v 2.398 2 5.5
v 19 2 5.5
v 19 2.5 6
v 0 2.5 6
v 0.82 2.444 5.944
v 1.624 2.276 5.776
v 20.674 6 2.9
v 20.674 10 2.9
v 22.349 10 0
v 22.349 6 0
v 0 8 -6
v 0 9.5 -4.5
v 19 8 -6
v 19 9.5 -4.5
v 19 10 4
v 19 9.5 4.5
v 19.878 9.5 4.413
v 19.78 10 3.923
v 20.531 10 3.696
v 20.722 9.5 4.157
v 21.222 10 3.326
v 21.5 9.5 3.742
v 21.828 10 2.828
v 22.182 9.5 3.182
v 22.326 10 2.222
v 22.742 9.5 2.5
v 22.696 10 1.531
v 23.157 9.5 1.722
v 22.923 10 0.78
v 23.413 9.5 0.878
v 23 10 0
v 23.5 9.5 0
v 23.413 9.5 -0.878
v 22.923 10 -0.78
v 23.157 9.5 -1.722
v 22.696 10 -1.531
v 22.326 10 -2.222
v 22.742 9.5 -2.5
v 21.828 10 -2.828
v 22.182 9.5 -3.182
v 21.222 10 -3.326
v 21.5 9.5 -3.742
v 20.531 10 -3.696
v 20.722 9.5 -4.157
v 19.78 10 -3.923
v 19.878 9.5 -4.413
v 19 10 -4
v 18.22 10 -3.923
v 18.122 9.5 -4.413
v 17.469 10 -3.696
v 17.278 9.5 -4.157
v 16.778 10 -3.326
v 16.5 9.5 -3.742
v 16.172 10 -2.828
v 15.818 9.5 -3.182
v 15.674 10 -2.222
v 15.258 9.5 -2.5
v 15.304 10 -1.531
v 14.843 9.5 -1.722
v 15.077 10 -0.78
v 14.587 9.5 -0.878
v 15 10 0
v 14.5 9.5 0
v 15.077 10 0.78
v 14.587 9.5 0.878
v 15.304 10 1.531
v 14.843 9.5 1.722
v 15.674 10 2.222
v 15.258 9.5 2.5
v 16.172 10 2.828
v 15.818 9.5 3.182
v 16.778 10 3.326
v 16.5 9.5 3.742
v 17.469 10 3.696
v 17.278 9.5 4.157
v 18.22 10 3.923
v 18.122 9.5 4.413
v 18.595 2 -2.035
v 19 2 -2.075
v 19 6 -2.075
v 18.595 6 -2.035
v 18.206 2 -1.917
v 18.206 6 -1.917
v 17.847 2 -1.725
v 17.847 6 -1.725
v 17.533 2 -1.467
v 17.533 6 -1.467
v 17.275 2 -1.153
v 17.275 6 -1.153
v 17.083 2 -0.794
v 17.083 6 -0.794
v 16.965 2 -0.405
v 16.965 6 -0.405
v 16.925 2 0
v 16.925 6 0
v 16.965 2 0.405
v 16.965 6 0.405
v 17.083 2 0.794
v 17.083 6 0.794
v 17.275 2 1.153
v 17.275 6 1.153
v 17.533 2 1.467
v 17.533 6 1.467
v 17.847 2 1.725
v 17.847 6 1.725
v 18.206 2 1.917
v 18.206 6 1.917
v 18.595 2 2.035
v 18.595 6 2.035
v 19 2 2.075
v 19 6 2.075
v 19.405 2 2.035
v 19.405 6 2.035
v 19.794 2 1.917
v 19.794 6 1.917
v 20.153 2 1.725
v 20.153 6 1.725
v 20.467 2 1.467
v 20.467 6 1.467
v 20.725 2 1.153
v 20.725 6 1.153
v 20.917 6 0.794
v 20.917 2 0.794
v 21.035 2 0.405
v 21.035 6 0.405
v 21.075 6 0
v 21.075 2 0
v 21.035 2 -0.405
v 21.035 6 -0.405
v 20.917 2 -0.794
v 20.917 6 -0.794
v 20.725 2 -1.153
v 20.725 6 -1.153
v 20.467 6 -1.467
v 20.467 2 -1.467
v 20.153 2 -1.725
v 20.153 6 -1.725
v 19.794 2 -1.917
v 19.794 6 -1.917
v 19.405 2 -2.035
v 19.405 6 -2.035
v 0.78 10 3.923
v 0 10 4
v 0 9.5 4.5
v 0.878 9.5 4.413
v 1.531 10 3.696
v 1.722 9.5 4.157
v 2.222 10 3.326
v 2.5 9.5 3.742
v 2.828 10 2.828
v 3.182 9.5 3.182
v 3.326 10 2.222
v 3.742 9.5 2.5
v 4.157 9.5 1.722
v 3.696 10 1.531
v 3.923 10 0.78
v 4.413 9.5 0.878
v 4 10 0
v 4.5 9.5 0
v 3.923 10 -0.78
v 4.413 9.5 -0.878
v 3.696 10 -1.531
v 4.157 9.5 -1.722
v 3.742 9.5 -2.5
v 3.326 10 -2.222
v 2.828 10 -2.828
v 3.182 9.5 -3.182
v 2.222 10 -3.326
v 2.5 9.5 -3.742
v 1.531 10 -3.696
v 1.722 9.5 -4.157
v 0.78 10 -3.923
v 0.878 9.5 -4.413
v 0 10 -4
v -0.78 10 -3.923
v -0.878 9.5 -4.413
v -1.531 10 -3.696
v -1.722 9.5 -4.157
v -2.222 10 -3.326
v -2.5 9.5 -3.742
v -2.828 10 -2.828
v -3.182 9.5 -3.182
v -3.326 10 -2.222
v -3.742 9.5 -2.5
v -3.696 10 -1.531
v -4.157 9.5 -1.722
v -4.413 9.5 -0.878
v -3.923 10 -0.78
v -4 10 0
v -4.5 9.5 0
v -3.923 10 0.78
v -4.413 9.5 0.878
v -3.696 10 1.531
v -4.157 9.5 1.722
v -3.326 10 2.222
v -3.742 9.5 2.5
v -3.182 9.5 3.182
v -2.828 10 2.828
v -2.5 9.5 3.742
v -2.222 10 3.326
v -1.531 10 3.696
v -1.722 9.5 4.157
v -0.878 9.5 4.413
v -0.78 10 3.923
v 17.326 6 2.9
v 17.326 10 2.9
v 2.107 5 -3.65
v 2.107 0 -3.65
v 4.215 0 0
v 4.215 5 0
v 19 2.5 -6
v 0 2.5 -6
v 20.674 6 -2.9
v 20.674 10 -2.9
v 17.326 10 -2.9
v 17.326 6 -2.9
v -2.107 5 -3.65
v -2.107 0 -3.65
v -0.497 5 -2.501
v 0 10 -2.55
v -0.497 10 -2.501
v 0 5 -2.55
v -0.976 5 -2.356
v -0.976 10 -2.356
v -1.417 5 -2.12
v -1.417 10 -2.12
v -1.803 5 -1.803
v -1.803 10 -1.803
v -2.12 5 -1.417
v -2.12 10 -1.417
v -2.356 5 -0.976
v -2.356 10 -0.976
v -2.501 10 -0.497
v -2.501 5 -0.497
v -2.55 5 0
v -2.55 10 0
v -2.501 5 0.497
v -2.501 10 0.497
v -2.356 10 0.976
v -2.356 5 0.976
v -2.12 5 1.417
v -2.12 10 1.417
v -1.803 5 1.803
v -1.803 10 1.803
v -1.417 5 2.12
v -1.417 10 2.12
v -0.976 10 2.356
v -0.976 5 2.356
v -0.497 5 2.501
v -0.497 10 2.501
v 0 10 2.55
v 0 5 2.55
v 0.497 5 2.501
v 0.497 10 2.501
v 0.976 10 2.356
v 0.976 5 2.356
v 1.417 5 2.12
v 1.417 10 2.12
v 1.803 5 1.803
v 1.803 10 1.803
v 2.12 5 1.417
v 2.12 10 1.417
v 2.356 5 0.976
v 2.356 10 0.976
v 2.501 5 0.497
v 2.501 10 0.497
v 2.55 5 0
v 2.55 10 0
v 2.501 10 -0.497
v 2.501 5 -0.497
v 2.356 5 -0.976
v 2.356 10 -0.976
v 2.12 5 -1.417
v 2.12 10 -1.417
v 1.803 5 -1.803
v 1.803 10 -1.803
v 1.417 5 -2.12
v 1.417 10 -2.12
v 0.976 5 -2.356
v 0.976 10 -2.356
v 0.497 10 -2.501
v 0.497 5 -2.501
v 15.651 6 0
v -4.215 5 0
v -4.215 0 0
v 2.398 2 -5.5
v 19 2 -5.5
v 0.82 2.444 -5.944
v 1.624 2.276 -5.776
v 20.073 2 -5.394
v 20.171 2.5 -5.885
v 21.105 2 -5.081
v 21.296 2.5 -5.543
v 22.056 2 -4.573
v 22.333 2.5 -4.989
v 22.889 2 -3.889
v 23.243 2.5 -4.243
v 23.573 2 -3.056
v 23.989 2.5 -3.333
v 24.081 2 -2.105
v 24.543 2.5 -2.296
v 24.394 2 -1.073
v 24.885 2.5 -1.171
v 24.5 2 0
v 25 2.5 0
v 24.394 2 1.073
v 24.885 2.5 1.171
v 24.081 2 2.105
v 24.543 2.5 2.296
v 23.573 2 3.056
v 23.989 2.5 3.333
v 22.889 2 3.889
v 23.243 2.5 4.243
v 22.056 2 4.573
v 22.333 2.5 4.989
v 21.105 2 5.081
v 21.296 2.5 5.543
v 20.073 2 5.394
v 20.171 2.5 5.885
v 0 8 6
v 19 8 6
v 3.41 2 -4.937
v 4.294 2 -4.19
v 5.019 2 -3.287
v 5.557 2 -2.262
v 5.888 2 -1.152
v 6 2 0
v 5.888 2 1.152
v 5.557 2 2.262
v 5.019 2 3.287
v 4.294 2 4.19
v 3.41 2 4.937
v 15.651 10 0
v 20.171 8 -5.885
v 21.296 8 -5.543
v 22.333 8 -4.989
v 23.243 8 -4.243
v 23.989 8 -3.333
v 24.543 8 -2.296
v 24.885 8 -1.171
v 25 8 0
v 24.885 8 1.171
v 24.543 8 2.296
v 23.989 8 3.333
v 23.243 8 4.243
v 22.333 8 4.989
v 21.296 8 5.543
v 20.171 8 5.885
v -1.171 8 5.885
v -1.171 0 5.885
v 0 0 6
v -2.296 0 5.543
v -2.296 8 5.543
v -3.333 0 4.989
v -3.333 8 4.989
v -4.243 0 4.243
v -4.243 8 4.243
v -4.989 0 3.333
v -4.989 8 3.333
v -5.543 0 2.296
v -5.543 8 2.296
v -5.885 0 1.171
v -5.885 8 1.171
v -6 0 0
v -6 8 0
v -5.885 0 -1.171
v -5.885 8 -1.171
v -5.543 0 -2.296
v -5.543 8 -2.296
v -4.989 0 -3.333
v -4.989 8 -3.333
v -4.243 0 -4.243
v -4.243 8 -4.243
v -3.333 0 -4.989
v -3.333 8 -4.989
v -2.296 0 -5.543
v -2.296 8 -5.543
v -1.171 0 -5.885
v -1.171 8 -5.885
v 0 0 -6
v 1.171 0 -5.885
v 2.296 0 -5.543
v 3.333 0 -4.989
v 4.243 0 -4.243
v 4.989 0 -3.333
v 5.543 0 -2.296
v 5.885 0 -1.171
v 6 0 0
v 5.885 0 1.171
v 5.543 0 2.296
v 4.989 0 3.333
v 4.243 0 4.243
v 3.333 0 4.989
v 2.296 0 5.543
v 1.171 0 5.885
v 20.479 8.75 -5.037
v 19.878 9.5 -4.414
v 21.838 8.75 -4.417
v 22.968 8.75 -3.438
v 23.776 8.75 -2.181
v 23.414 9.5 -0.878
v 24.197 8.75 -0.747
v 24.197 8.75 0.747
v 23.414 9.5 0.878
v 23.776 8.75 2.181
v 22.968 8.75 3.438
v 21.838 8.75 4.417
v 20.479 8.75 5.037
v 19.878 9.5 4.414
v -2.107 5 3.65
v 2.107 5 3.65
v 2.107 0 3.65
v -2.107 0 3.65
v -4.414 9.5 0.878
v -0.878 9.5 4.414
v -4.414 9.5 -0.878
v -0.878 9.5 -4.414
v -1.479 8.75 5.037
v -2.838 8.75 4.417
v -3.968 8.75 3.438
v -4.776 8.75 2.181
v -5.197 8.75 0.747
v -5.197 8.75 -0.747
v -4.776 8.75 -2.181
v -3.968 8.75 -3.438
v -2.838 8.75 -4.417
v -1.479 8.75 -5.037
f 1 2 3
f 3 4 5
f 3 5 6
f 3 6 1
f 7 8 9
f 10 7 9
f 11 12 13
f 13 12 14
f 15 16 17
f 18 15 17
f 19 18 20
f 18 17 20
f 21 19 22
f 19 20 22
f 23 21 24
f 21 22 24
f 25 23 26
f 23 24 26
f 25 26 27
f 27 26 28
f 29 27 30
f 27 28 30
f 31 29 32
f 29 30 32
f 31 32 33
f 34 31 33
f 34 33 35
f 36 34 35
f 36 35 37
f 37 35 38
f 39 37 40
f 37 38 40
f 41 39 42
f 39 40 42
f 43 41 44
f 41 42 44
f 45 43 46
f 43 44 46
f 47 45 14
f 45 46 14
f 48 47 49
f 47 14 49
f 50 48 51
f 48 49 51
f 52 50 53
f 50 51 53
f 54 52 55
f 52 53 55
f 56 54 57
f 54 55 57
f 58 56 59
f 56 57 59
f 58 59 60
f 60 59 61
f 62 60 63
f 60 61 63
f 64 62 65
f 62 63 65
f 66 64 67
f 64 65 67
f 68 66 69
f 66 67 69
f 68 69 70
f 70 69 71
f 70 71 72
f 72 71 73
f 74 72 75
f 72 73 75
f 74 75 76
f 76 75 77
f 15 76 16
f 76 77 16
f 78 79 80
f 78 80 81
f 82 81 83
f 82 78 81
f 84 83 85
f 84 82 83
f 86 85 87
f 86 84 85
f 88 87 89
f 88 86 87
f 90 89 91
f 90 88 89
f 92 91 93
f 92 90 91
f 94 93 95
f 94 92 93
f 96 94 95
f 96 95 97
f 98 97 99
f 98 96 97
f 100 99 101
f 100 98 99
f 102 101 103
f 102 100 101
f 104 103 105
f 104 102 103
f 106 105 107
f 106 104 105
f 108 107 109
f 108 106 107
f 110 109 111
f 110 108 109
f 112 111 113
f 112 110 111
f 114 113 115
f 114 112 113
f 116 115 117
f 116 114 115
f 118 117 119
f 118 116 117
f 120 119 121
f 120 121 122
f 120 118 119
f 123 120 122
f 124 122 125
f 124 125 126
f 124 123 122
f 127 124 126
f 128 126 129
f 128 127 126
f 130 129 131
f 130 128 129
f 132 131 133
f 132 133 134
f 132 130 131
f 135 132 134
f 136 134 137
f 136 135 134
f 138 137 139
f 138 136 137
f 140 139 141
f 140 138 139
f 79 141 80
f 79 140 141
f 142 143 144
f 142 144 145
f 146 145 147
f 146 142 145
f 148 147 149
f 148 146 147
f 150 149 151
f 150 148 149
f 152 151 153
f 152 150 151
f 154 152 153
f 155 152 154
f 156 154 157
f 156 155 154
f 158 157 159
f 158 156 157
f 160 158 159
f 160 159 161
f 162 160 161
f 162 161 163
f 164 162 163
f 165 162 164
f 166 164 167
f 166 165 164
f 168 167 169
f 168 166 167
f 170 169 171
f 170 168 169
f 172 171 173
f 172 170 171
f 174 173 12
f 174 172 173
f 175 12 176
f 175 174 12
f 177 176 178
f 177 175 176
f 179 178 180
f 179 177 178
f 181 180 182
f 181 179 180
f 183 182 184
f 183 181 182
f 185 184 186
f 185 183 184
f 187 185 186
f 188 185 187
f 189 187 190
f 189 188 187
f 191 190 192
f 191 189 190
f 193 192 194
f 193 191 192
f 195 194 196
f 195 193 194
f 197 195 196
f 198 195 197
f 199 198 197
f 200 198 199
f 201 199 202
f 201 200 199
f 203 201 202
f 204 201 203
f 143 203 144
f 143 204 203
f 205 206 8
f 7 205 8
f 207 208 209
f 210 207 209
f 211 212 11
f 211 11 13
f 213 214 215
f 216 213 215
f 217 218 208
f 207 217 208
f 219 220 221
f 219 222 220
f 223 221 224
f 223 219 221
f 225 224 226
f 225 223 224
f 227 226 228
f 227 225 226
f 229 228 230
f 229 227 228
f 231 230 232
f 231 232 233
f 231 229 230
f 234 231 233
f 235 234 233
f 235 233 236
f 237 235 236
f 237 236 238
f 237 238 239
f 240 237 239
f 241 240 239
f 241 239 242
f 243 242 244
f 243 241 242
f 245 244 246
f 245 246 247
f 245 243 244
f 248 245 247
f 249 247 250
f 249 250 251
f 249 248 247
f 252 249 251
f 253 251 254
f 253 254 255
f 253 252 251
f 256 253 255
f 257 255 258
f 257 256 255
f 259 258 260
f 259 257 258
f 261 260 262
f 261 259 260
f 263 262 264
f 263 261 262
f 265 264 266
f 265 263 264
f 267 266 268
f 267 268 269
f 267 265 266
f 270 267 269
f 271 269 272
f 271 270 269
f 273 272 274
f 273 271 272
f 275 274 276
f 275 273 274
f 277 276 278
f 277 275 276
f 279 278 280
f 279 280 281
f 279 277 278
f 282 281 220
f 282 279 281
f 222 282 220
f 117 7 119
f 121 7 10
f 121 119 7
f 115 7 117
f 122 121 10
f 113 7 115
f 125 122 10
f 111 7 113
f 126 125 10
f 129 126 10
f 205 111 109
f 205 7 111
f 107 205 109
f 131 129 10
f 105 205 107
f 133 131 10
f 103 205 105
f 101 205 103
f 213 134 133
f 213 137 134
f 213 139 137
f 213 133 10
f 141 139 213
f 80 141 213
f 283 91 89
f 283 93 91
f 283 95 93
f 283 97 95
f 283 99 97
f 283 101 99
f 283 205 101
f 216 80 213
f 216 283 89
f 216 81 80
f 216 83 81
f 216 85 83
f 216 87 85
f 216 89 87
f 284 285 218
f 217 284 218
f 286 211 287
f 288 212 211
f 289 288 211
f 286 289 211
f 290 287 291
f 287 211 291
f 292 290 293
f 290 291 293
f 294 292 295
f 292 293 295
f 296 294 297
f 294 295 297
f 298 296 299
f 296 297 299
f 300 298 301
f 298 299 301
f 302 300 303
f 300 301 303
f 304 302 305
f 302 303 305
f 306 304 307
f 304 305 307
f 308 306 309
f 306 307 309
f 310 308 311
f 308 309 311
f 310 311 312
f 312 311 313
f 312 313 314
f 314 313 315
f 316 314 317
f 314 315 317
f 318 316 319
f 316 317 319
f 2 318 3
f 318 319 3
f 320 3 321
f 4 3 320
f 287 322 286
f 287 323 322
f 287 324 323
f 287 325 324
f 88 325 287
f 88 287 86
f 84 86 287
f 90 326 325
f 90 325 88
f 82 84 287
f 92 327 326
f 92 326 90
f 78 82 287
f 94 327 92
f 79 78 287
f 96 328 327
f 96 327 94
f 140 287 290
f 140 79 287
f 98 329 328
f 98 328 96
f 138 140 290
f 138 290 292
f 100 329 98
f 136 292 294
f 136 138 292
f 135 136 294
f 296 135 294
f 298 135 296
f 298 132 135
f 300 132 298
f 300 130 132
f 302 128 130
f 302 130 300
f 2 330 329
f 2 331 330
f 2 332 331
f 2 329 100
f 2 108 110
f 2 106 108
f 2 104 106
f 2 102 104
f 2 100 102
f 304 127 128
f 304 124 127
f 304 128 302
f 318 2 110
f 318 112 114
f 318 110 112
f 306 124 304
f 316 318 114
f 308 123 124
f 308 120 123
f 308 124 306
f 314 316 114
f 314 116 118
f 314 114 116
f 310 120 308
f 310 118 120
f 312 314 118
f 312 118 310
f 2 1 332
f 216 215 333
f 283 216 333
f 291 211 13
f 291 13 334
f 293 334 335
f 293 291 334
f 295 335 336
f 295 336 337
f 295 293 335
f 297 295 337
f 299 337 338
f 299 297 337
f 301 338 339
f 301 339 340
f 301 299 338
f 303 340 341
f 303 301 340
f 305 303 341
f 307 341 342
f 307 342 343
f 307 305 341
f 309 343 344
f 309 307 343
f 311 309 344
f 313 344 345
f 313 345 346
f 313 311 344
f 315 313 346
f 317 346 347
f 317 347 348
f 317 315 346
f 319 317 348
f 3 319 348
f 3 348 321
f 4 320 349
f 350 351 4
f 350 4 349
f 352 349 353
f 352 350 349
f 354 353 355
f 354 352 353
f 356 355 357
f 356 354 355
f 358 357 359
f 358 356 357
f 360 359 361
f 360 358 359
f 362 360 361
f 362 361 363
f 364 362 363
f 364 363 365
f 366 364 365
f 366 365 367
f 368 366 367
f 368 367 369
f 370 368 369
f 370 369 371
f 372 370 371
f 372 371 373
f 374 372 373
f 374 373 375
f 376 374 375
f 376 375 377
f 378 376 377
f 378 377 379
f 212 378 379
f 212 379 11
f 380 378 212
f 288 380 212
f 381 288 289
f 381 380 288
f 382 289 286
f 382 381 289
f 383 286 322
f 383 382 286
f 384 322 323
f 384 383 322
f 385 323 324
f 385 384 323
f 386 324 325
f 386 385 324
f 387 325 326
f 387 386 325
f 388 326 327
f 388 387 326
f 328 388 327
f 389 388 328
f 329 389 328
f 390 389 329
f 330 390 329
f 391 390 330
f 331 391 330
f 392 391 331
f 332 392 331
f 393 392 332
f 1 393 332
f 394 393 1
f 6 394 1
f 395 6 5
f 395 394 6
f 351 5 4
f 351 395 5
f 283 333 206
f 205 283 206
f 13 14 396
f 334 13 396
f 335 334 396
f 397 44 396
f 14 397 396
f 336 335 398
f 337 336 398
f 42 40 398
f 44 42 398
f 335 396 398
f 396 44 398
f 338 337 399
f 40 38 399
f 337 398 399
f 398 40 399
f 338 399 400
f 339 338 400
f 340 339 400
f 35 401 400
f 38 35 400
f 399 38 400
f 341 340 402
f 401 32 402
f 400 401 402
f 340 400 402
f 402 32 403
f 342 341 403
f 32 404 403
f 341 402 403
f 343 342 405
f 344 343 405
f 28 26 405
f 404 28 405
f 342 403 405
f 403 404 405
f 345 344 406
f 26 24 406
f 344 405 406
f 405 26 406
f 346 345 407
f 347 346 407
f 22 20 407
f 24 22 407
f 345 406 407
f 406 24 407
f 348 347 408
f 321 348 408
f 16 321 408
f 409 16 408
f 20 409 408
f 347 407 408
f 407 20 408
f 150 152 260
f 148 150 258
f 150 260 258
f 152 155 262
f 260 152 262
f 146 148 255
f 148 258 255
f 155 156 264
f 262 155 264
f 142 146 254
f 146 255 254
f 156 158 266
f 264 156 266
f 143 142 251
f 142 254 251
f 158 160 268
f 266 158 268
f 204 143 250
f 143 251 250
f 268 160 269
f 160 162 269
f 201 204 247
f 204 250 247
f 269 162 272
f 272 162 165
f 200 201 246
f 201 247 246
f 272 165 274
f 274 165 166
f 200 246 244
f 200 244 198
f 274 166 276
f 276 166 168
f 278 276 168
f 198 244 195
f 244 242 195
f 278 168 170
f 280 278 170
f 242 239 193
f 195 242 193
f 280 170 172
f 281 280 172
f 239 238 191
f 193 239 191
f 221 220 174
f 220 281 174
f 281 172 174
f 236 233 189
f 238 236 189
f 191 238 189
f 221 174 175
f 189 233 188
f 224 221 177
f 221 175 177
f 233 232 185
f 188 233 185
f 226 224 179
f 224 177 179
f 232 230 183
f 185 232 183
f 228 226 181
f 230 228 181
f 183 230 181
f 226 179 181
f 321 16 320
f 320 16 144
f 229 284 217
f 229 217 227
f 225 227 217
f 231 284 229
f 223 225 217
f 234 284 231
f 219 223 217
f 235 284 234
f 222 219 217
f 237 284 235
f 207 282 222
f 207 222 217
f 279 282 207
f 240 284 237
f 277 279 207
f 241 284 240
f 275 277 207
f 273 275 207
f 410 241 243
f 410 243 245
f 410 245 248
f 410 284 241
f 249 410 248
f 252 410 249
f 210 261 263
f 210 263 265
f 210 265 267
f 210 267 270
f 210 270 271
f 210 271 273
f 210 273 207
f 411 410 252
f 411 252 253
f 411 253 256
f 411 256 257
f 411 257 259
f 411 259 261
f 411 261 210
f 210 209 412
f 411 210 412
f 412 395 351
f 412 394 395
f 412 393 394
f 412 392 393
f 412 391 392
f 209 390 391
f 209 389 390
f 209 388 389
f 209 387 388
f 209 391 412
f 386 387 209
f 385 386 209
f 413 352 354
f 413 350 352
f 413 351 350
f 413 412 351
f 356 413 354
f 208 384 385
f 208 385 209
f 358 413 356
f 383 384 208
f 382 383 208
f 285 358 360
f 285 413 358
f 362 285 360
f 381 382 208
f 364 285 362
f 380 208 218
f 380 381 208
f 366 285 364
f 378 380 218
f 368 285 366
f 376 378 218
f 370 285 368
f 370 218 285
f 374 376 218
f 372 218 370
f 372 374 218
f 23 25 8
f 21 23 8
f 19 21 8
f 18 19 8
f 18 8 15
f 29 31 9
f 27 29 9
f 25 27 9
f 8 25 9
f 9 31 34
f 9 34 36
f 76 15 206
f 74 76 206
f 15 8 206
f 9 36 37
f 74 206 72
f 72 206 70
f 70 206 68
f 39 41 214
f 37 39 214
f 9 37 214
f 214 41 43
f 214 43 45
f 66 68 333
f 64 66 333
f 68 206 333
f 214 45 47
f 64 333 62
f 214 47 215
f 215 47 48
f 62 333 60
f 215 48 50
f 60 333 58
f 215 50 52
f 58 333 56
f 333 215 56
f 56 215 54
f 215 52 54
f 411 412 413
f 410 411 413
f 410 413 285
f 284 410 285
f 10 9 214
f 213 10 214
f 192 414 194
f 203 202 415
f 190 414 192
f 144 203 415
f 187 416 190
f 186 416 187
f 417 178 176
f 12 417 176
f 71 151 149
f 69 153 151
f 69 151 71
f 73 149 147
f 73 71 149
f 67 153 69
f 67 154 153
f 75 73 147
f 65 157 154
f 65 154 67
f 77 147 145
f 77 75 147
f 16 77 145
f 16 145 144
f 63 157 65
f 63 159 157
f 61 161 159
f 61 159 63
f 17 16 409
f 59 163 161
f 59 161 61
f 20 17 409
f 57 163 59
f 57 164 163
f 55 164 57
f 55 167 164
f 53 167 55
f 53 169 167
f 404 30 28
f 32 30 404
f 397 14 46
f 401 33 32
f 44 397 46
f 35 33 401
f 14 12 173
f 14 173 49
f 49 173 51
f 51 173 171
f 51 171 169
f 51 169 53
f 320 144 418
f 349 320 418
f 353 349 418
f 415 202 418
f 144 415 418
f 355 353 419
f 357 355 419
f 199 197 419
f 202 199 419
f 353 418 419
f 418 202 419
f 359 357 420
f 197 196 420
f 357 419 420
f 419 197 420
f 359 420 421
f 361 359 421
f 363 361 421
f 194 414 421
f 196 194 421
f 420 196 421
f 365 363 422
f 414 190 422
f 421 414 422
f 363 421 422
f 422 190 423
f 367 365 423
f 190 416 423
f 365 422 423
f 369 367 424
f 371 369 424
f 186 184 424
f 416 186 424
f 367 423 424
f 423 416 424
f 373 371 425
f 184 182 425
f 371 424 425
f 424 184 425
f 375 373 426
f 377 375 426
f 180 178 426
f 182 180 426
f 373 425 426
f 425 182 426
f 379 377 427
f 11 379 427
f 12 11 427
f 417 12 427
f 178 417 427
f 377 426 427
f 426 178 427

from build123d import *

# Parameters (mm, degrees)
BOSS_EXTRUDE1_DEPTH = 10
CHAMFER1_SIZE       = 2
CUT_EXTRUDE1_DEPTH  = 5
SKETCH5_R           = 34.202431596
SKETCH5_R_2         = 6
CUT_EXTRUDE2_DEPTH  = 2
CUT_EXTRUDE3_DEPTH  = 4
CHAMFER2_SIZE       = 0.5
SKETCH7_W           = 40.92273168
SKETCH7_H           = 22.154300558
SKETCH7_R           = 4
CUT_EXTRUDE4_DEPTH  = 0.5
CHAMFER3_SIZE       = 0.5


# Some blends are built 0.0001 mm under size
with BuildPart() as part:
    # Sketch1 → Boss-Extrude1 (new body)
    with BuildSketch(Plane(origin=(0, 0, 0), x_dir=(1, 0, 0), z_dir=(0, 1, 0))):
        with BuildLine():
            Line((0, 6), (19, 6))
            ThreePointArc((19, 6), (25, 0), (19, -6))
            Line((19, -6), (0, -6))
            ThreePointArc((0, -6), (-6, 0), (0, 6))
        make_face()
    extrude(amount=BOSS_EXTRUDE1_DEPTH)

    # Sketch2 → Cut-Revolve1 (revolve, cut)
    with BuildSketch(Plane.XY, mode=Mode.PRIVATE) as cut_revolve1_sk:
        Polygon((0, 10), (-2.55, 10), (-2.55, 5), (-2.1, 5), (-2.1, 2), (-2.55, 2), (-2.55, 0), (0, 0), align=None)
    revolve(cut_revolve1_sk.sketch.rotate(Axis((0, 0, 0), (0, 1, 0)), 270), axis=Axis((0, 0, 0), (0, 1, 0)), mode=Mode.SUBTRACT)

    # Sketch3 → Cut-Revolve2 (revolve, cut)
    with BuildSketch(Plane.XY, mode=Mode.PRIVATE) as cut_revolve2_sk:
        Polygon((19, 10), (16.5, 10), (16.5, 6), (16.925, 6), (16.925, 0), (19, 0), align=None)
    revolve(cut_revolve2_sk.sketch.rotate(Axis((19, 0, 0), (0, 1, 0)), 270), axis=Axis((19, 0, 0), (0, 1, 0)), mode=Mode.SUBTRACT)

    # Chamfer1
    chamfer1_edges = [part.edges().sort_by_distance(p)[0] for p in [
        (25, 10, 0),
        (9.5, 10, -6),
        (-6, 10, 0),
        (9.5, 10, 6),
    ]]
    chamfer(chamfer1_edges, length=CHAMFER1_SIZE)

    # Sketch4 → Cut-Extrude1 (cut)
    with BuildSketch(Plane.XZ):
        Polygon((2.107328483, 3.65), (-2.107328483, 3.65), (-4.214656965, 0), (-2.107328483, -3.65), (2.107328483, -3.65), (4.214656965, 0), align=None)
    extrude(amount=-CUT_EXTRUDE1_DEPTH, mode=Mode.SUBTRACT)

    # Sketch5 → Cut-Extrude2 (cut)
    with BuildSketch(Plane.XZ):
        Circle(SKETCH5_R)
        with Locations(Location((0, 0, 0), (0, 0, 90))):
            Circle(SKETCH5_R_2, mode=Mode.SUBTRACT)
    extrude(amount=-CUT_EXTRUDE2_DEPTH, mode=Mode.SUBTRACT)

    # Sketch6 → Cut-Extrude3 (cut)
    with BuildSketch(Plane(origin=(0, 10, 0), x_dir=(1, 0, 0), z_dir=(0, 1, 0))):
        Polygon((20.674315781, -2.9), (22.348631561, 0), (20.674315781, 2.9), (17.325684219, 2.9), (15.651368439, 0), (17.325684219, -2.9), align=None)
    extrude(amount=-CUT_EXTRUDE3_DEPTH, mode=Mode.SUBTRACT)

    # Chamfer2
    # the kernel refuses this chamfer: 0.5 mm, written as the material it takes off along each edge
    with BuildSketch(Plane(origin=(19, 2, 0), x_dir=(0, 0, -1), z_dir=(-1, 0, 0))) as chamfer2_piece_1:
        Polygon((6 - CHAMFER2_SIZE, 0), (6, -CHAMFER2_SIZE), (6, 0), align=None)
    revolve(axis=Axis((19, 2, 0), (0, -1, 0)), revolution_arc=180, mode=Mode.SUBTRACT)
    with BuildSketch(Plane(origin=(-1.285841494, 2, 6), x_dir=(0, -0.02749587661058651, -0.9996219169112968), z_dir=(1, 0, 0))) as chamfer2_piece_2_section:
        Polygon((CHAMFER2_SIZE * 0.999621916911, CHAMFER2_SIZE * 0.0274958766106), (-CHAMFER2_SIZE * 0.0274958766106, CHAMFER2_SIZE * 0.999621916911), (0, 0), align=None)
    chamfer2_piece_2 = extrude(amount=20.285841494, mode=Mode.PRIVATE)
    chamfer2_piece_2 = chamfer2_piece_2 - Plane(origin=(0, 2.170377839, 0), x_dir=(0, 0, 1), z_dir=(0, -1, 0)) * Cylinder(6, 43, mode=Mode.PRIVATE)
    add(chamfer2_piece_2, mode=Mode.SUBTRACT)
    with BuildSketch(Plane(origin=(19, 2, -6), x_dir=(0, 0.9996219169112968, -0.027495876610585623), z_dir=(-1, 0, 0))) as chamfer2_piece_3_section:
        Polygon((CHAMFER2_SIZE * 0.999621916911, -CHAMFER2_SIZE * 0.0274958766106), (-CHAMFER2_SIZE * 0.0274958766106, -CHAMFER2_SIZE * 0.999621916911), (0, 0), align=None)
    chamfer2_piece_3 = extrude(amount=20.285841494, mode=Mode.PRIVATE)
    chamfer2_piece_3 = chamfer2_piece_3 - Plane(origin=(0, 2.17037784, 0), x_dir=(0, 0, 1), z_dir=(0, -1, 0)) * Cylinder(6, 43, mode=Mode.PRIVATE)
    add(chamfer2_piece_3, mode=Mode.SUBTRACT)

    # Sketch7 → Cut-Extrude4 (cut)
    with BuildSketch(Plane(origin=(0, 10, 0), x_dir=(1, 0, 0), z_dir=(0, 1, 0))):
        with Locations((9.45107525, -1.501135351)):
            Rectangle(SKETCH7_W, SKETCH7_H)
        with Locations(Location((19, 0, 0), (0, 0, 270))):
            Circle(SKETCH7_R, mode=Mode.SUBTRACT)
        with Locations(Location((0, 0, 0), (0, 0, 270))):
            Circle(SKETCH7_R, mode=Mode.SUBTRACT)
    extrude(amount=-CUT_EXTRUDE4_DEPTH, mode=Mode.SUBTRACT)

    # Chamfer3
    chamfer3_edges = [part.edges().sort_by_distance(p)[0] for p in [
        (0, 9.5, -4),
        (19, 9.5, -4),
    ]]
    chamfer(chamfer3_edges, length=CHAMFER3_SIZE - 0.0001)  # a hair under: the kernel refuses the full size


solid = part.part
